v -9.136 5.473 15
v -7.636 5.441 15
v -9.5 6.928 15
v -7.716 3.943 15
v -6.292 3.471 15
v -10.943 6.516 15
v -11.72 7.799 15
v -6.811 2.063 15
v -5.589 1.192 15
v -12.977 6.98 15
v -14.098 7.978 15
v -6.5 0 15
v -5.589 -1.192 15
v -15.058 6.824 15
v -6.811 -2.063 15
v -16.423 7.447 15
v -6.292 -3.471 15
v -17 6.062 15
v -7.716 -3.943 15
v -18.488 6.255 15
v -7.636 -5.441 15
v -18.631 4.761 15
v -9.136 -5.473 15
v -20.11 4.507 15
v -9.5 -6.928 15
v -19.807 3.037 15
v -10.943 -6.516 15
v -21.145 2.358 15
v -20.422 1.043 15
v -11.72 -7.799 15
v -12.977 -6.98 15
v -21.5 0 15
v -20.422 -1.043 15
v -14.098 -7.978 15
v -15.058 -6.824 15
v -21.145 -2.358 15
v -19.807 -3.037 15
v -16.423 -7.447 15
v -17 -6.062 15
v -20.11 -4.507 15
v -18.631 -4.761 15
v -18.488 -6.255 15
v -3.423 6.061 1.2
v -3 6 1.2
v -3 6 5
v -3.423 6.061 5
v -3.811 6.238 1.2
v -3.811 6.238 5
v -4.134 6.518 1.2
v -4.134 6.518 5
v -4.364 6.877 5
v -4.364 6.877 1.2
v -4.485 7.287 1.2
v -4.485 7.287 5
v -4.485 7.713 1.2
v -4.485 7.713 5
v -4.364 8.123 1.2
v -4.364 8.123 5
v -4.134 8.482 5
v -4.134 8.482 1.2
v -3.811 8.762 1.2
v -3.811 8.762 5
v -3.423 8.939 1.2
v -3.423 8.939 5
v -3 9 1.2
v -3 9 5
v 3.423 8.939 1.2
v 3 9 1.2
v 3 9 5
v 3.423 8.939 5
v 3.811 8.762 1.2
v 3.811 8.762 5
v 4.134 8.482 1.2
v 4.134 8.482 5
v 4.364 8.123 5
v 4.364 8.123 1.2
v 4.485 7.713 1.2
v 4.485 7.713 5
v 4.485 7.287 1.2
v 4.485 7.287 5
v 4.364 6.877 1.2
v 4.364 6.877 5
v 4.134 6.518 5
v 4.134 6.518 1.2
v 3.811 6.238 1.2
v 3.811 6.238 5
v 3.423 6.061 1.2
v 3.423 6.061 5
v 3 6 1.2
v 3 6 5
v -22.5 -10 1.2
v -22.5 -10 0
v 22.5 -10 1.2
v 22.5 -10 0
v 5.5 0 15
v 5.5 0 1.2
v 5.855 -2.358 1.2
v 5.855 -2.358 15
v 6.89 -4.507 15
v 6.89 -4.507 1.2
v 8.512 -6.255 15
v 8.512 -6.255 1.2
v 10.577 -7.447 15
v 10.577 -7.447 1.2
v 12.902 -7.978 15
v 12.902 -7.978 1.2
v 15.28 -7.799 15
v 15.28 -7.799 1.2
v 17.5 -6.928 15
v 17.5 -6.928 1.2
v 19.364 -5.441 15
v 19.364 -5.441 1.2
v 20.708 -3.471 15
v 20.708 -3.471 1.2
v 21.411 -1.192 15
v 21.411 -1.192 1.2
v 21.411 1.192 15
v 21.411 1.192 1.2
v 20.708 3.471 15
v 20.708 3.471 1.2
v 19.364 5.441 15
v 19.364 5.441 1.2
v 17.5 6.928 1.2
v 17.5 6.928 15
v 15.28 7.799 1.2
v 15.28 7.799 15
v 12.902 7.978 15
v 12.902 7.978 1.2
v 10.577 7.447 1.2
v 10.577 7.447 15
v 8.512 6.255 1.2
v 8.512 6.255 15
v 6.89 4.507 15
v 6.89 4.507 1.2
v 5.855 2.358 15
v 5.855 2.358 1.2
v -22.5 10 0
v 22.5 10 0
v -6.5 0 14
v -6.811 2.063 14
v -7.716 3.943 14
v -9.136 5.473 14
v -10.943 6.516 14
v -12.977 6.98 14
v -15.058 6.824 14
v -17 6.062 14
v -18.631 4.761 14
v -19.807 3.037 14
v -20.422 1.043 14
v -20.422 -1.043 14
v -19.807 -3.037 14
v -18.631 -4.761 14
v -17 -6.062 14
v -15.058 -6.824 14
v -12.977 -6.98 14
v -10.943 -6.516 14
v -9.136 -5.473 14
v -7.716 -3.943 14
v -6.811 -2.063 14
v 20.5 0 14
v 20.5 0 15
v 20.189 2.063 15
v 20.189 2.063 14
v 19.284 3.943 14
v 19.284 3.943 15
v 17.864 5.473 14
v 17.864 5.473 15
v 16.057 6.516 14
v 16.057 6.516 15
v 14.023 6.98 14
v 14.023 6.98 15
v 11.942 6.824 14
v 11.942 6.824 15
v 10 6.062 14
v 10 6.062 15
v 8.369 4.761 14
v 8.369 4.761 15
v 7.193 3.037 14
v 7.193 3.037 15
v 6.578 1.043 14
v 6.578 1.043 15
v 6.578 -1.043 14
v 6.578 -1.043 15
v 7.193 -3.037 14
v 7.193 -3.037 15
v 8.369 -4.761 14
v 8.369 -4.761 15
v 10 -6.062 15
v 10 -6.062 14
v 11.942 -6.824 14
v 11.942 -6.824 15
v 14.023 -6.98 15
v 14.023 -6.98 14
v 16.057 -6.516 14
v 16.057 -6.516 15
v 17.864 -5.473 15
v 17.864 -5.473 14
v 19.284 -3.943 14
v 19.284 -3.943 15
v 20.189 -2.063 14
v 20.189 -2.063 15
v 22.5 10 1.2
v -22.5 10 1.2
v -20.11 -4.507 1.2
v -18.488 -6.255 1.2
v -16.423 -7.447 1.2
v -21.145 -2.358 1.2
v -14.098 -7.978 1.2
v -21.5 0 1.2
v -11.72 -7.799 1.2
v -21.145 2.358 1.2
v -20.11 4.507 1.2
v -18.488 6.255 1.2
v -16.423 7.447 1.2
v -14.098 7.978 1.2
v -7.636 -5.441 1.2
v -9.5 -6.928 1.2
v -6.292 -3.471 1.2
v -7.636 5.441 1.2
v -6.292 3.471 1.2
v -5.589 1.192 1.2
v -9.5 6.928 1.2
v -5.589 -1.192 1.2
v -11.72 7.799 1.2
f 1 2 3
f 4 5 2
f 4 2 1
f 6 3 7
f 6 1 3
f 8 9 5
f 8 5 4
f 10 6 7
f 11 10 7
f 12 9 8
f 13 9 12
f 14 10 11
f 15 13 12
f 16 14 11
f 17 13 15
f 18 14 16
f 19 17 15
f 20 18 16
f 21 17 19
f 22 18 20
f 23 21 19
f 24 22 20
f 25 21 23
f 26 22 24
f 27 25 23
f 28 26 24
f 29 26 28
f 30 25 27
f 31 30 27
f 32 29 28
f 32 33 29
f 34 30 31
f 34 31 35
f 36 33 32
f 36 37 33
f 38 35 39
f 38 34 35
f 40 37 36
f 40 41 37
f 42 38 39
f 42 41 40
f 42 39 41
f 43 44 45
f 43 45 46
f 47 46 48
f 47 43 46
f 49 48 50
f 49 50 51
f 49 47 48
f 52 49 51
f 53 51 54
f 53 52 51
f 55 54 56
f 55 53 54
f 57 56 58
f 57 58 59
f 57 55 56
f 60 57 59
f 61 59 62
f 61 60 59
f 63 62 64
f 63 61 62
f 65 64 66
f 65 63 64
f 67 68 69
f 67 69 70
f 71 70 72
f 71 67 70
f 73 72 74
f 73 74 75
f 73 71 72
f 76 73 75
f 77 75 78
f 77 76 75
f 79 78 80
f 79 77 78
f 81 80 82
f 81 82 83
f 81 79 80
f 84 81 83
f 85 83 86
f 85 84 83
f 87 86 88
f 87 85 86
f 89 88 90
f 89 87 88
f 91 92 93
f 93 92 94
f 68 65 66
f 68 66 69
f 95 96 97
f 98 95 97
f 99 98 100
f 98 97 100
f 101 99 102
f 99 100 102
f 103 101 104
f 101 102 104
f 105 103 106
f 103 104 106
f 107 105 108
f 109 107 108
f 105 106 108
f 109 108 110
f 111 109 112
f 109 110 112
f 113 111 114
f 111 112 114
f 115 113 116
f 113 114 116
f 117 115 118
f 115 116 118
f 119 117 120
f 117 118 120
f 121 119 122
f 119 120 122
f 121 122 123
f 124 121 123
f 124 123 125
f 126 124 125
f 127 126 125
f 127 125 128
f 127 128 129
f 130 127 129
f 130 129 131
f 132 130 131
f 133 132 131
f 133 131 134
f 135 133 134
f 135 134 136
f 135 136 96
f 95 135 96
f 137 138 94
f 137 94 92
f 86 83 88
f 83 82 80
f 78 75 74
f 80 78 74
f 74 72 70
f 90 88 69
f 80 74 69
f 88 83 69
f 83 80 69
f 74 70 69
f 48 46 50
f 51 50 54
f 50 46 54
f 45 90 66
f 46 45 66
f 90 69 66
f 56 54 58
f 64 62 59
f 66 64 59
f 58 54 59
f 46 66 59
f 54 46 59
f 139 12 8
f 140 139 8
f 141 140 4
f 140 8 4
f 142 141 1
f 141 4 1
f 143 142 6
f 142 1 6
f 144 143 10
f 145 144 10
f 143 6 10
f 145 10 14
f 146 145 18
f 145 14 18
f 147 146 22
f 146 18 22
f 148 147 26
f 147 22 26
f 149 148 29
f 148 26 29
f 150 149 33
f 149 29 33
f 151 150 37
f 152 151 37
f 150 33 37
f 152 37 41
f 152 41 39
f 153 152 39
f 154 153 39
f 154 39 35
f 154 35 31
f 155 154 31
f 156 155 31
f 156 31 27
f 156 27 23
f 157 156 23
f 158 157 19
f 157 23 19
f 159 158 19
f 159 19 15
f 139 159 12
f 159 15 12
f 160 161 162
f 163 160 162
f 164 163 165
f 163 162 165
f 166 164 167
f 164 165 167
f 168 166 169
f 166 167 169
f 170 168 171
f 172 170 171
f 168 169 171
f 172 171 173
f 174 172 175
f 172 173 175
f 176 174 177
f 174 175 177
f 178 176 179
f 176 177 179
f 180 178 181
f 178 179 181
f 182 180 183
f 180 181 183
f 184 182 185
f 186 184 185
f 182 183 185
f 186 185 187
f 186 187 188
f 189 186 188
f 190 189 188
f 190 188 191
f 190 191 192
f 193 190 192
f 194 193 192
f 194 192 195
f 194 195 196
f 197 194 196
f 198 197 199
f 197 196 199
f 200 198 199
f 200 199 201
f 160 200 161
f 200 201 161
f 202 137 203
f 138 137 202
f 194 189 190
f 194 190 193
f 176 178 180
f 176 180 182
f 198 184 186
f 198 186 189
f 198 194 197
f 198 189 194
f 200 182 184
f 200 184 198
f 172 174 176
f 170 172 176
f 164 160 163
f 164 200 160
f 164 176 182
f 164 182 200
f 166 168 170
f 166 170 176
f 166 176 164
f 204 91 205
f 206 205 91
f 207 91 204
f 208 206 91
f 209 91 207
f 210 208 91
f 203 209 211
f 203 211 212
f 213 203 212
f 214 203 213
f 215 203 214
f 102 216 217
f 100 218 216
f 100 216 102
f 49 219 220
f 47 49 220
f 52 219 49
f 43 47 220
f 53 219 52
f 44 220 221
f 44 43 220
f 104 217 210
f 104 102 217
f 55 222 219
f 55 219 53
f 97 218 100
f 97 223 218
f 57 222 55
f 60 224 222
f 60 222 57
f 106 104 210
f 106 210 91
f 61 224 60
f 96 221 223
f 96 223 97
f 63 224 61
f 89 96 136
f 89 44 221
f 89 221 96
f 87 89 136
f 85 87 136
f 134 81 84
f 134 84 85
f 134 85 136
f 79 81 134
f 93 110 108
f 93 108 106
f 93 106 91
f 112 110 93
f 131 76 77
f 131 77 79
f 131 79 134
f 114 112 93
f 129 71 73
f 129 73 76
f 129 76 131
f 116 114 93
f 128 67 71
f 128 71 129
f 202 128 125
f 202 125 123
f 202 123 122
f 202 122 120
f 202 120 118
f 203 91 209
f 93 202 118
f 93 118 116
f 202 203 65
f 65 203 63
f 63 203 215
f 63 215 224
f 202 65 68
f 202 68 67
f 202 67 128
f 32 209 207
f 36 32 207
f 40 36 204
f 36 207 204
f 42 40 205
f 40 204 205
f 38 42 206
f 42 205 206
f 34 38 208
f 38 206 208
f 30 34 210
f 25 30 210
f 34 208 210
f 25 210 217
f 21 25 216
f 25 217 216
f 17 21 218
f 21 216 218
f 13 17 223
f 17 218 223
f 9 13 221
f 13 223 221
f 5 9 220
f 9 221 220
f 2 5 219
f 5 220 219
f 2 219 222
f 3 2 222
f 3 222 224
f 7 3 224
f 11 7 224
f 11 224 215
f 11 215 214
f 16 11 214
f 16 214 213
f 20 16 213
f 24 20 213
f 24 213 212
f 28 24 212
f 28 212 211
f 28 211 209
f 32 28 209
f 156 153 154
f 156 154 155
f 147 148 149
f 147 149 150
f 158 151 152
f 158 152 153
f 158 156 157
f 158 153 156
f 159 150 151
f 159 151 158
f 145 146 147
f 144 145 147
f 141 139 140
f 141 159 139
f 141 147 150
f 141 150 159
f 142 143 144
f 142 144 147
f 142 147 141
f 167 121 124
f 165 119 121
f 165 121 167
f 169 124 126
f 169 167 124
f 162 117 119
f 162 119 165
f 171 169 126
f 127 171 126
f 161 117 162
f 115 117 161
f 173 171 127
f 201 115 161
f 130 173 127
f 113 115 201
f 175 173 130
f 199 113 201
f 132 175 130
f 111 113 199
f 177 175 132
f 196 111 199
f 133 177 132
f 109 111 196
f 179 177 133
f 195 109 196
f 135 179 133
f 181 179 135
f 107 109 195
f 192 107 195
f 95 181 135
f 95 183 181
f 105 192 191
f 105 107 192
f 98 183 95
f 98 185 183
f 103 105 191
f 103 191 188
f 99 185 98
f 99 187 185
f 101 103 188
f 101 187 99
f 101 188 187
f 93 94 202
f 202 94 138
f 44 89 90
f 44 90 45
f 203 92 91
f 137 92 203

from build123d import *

# Parameters (mm, degrees)
SKETCH_1_W          = 45
SKETCH_1_H          = 20
EXTRUDE_1_DEPTH     = 1.2
SKETCH_2_R          = 8
EXTRUDE_2_DEPTH     = 15
EXTRUDE_3_DEPTH     = 5
CUT_EXTRUDE_START   = 15
SKETCH_5_R          = 7
CUT_EXTRUDE_1_DEPTH = 1


with BuildPart() as part:
    # 草图1 → 凸台-拉伸1 (new body)
    with BuildSketch(Plane.XY):
        Rectangle(SKETCH_1_W, SKETCH_1_H)
    extrude(amount=EXTRUDE_1_DEPTH)

    # 草图2 → 凸台-拉伸2 (add)
    with BuildSketch(Plane.XY):
        with Locations(Location((-13.5, 0, 0), (0, 0, 180))):
            Circle(SKETCH_2_R)
        with Locations(Location((13.5, 0, 0), (0, 0, 180))):
            Circle(SKETCH_2_R)
    extrude(amount=EXTRUDE_2_DEPTH)

    # 草图3 → 凸台-拉伸3 (add)
    with BuildSketch(Plane.XY):
        with BuildLine():
            Line((-3, 9), (3, 9))
            ThreePointArc((3, 9), (4.5, 7.5), (3, 6))
            Line((3, 6), (-3, 6))
            ThreePointArc((-3, 6), (-4.5, 7.5), (-3, 9))
        make_face()
    extrude(amount=EXTRUDE_3_DEPTH)

    # 草图5 → 切除-拉伸1 (cut)
    with BuildSketch(Plane.XY.offset(CUT_EXTRUDE_START)):
        with Locations((-13.5, 0)):
            Circle(SKETCH_5_R)
        with Locations((13.5, 0)):
            Circle(SKETCH_5_R)
    extrude(amount=-CUT_EXTRUDE_1_DEPTH, mode=Mode.SUBTRACT)


solid = part.part
